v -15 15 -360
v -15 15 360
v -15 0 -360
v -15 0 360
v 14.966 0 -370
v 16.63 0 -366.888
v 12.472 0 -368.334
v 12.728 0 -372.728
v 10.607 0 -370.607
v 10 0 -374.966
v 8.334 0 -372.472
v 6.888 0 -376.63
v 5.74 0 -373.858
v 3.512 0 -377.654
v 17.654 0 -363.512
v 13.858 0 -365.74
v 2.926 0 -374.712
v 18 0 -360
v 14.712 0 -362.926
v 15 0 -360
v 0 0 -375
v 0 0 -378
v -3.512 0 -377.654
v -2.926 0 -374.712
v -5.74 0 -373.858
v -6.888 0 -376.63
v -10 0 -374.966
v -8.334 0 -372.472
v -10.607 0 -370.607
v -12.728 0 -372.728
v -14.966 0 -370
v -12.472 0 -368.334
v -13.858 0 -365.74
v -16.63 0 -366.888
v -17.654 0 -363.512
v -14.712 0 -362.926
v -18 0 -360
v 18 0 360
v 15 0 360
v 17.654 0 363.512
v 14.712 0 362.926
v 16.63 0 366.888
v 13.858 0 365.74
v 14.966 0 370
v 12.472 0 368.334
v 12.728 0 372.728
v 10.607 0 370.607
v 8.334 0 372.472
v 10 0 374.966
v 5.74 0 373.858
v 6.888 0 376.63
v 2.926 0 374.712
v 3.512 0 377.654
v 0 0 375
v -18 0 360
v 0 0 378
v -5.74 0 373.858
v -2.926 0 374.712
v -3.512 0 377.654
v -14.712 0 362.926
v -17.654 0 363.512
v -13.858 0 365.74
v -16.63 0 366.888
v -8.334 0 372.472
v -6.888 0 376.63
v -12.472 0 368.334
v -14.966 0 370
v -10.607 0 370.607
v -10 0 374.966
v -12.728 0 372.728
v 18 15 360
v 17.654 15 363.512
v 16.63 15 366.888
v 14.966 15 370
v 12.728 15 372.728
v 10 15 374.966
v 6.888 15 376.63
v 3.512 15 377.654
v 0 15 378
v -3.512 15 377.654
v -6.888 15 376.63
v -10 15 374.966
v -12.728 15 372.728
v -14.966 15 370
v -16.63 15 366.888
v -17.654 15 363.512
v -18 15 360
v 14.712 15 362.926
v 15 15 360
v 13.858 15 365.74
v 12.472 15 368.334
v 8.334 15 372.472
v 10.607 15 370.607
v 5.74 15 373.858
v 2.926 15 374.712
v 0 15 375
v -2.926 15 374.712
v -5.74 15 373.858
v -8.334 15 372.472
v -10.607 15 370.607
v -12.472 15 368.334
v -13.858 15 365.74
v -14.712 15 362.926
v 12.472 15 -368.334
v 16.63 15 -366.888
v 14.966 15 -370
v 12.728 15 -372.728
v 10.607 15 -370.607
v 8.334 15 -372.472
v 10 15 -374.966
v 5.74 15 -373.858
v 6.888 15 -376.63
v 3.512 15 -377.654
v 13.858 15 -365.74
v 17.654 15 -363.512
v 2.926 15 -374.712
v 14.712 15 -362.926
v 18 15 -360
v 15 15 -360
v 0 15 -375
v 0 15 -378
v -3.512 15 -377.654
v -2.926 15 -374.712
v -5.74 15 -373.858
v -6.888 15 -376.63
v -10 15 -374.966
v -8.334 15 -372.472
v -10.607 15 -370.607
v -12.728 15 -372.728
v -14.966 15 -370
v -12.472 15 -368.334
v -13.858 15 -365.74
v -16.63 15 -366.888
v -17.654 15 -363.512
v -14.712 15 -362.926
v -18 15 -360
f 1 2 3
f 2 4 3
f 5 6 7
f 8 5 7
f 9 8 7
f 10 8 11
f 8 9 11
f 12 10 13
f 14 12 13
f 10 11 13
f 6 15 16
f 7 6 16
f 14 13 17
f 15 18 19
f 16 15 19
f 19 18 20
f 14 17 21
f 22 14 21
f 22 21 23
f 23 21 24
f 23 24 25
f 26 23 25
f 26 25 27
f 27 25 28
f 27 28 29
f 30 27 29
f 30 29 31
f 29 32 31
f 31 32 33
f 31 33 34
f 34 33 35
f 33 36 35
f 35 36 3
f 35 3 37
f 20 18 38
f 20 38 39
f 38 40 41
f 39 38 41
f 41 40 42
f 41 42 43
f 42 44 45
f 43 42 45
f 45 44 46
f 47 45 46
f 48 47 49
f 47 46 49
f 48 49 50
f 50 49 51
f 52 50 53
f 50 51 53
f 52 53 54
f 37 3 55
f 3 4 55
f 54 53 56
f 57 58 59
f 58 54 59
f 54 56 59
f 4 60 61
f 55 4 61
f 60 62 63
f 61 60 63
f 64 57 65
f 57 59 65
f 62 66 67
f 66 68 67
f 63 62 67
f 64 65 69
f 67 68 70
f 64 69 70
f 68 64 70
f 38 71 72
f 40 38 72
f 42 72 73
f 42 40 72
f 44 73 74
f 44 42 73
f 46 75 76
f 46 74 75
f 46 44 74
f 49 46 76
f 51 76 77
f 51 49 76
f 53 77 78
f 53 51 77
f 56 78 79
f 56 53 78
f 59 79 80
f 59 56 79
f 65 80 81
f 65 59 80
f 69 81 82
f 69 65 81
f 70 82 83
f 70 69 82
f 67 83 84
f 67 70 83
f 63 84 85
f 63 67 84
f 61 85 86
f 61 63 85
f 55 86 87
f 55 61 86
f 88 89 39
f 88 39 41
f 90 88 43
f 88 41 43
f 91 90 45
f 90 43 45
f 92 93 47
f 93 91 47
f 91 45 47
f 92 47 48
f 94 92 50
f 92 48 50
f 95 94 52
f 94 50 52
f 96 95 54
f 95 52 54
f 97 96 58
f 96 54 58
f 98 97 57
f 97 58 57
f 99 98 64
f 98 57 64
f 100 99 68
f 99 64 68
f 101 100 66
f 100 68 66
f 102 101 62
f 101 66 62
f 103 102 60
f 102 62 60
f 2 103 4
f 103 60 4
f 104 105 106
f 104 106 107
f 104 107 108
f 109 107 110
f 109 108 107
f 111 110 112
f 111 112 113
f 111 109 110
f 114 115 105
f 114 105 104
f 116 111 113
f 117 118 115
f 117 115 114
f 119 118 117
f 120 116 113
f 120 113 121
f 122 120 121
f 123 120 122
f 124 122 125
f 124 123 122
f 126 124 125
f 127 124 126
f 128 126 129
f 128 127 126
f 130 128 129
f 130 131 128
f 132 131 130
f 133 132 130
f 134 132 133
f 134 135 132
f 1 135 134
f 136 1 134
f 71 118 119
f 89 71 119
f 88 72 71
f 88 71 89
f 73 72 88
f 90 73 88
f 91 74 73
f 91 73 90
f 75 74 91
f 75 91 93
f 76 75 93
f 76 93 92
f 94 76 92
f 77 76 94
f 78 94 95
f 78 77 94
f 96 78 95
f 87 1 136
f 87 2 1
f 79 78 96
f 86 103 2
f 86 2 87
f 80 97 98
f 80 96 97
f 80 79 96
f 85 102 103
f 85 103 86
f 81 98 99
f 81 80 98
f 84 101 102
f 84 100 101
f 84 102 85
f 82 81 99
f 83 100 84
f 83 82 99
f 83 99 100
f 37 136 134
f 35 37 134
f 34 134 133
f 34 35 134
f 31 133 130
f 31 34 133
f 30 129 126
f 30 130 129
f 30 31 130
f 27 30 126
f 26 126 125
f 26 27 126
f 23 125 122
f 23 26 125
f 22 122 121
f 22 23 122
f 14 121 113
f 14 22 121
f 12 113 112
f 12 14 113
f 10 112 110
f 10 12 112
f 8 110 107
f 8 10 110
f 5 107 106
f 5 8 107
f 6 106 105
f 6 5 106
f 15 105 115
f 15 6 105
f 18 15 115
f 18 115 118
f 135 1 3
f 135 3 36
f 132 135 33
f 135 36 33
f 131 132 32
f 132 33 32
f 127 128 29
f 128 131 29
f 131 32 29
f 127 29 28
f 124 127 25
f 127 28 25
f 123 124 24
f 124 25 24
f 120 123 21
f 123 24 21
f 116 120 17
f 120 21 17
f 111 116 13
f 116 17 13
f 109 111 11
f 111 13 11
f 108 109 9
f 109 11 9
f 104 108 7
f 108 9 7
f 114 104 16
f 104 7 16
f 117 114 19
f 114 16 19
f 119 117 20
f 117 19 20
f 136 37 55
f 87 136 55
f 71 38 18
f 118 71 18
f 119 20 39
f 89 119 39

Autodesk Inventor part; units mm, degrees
ref_plane "YZ Plane" through (0, 0, 0) normal (1, 0, 0) x (0, 1, 0)
ref_plane "XZ Plane" through (0, 0, 0) normal (0, 1, 0) x (-1, 0, 0)
ref_plane "XY Plane" through (0, 0, 0) normal (0, 0, 1) x (1, 0, 0)
sketch "Sketch1" plane through (0, 0, 0) normal (0, 1, 0) x (-1, 0, 0)
  line L0 (0, 375) -> (0, -375) construction
  line L1 (15, 360) -> (15, -360)
  line L2 (-15, -360) -> (-15, 360)
  arc A0 (15, 360) -> (-15, 360) centre (0, 360) ccw
  arc A1 (-15, -360) -> (15, -360) centre (0, -360) ccw
  line L3 (18, -360) -> (18, 360)
  arc A2 (18, 360) -> (-18, 360) centre (0, 360) ccw
  line L4 (-18, 360) -> (-18, -360)
  arc A3 (-18, -360) -> (18, -360) centre (0, -360) ccw
  point P0 (0, 0)
  point P1 (0, 0)
  dimension "d0" = 15
  dimension "d1" = 720
  dimension "d2" = 3
extrude "Extrusion1" add sketch "Sketch1" along normal blind 15
properties part number "X_Zahnriemen"
